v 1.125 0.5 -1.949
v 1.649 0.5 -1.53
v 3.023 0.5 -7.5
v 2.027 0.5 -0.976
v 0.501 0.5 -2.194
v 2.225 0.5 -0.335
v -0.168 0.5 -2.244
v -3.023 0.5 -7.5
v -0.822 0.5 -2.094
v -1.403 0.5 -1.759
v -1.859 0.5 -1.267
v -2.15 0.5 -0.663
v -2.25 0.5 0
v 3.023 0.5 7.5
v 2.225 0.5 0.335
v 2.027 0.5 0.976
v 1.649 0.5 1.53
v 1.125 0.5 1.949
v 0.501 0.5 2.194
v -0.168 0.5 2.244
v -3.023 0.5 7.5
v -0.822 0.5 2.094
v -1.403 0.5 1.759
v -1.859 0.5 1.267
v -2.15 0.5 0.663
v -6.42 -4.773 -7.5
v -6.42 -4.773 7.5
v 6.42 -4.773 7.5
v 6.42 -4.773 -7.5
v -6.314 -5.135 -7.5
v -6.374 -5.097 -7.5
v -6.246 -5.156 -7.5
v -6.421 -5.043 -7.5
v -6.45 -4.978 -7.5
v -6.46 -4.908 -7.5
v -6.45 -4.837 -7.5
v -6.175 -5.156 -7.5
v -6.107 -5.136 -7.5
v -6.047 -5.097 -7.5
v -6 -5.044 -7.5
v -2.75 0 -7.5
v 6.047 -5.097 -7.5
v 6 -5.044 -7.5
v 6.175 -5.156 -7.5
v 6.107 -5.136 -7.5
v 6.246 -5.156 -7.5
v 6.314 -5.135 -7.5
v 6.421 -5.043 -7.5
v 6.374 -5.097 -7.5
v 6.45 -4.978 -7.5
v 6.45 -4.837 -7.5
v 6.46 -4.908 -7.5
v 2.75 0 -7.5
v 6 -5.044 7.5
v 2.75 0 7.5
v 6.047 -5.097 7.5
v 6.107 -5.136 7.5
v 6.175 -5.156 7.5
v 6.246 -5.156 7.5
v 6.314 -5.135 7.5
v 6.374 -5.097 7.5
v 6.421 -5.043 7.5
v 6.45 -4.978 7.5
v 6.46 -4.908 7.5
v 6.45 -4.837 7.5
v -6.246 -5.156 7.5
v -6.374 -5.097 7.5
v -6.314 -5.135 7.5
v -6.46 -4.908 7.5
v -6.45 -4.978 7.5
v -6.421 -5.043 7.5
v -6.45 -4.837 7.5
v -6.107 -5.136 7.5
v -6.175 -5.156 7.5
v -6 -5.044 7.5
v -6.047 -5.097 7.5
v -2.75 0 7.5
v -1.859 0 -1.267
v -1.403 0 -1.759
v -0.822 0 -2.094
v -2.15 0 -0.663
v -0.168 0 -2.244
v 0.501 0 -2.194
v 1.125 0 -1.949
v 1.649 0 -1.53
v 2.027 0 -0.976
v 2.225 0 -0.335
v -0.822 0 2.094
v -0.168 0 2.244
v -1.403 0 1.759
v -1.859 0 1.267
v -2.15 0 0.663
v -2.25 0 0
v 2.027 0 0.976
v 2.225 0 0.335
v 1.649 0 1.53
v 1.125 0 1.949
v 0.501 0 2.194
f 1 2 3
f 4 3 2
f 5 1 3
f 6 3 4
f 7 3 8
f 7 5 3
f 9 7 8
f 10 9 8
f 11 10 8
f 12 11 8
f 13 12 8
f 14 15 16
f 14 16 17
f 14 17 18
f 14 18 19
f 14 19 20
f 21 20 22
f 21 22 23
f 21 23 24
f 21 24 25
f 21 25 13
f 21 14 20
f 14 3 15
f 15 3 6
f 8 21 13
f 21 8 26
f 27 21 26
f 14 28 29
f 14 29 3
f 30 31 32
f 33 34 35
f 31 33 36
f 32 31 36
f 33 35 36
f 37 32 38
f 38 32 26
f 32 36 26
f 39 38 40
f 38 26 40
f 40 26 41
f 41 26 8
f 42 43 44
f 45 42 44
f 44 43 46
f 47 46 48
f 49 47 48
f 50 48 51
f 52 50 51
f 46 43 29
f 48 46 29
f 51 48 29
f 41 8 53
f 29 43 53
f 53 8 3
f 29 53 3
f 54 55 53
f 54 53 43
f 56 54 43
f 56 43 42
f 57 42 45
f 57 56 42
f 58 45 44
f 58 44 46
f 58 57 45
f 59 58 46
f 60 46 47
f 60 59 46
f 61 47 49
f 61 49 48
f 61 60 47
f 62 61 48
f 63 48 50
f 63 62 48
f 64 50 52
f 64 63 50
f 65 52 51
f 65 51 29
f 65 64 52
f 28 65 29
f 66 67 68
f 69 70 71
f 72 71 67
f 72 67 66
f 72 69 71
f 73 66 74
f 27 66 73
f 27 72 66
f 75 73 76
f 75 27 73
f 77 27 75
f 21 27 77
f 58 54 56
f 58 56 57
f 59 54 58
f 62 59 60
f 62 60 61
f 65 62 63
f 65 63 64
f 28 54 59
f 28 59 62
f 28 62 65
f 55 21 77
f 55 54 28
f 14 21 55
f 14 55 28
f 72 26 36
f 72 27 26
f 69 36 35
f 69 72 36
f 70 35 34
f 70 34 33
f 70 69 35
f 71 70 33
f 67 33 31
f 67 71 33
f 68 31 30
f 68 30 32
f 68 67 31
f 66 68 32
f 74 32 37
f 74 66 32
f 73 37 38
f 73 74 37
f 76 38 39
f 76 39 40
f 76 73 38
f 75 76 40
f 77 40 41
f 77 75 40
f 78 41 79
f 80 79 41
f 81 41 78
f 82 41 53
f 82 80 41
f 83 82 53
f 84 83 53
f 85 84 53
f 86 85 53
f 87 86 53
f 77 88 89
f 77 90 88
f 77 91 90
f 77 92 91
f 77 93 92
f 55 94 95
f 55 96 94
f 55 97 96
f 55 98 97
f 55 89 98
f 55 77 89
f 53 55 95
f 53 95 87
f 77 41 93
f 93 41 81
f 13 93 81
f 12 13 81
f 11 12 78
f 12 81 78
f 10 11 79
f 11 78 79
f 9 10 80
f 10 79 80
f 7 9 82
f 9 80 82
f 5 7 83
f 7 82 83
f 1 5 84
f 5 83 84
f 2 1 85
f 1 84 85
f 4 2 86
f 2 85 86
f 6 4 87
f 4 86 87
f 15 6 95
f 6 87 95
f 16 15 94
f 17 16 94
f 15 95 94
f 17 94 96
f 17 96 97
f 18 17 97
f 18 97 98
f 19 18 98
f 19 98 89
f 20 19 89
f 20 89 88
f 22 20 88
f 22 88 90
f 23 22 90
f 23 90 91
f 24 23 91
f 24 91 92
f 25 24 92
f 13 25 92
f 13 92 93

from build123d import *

# Parameters (mm, degrees)
BOSS_EXTRUDE1_DEPTH  = 7.5
M4_CLEARANCE_HOLE1_D = 4.5


with BuildPart() as part:
    # Sketch1 → Boss-Extrude1 (new, symmetric)
    with BuildSketch(Plane.XY):
        with BuildLine():
            Line((-2.75, 0), (2.75, 0))
            Line((2.75, 0), (6, -5.04356025))
            ThreePointArc((6, -5.04356025), (6.34556501, -5.118291928), (6.420296688, -4.772726917))
            Line((6.420296688, -4.772726917), (3.022624878, 0.5))
            Line((3.022624878, 0.5), (-3.022624878, 0.5))
            Line((-3.022624878, 0.5), (-6.420296688, -4.772726917))
            ThreePointArc((-6.420296688, -4.772726917), (-6.34556501, -5.118291928), (-6, -5.04356025))
            Line((-6, -5.04356025), (-2.75, 0))
        make_face()
    extrude(amount=BOSS_EXTRUDE1_DEPTH, both=True)

    # M4 Clearance Hole1 (through all)
    with Locations(Plane(origin=(0, 0.5, 0), x_dir=(1, 0, 0), z_dir=(0, 1, 0))):
        with Locations((0, 0)):
            Hole(M4_CLEARANCE_HOLE1_D / 2)


solid = part.part
